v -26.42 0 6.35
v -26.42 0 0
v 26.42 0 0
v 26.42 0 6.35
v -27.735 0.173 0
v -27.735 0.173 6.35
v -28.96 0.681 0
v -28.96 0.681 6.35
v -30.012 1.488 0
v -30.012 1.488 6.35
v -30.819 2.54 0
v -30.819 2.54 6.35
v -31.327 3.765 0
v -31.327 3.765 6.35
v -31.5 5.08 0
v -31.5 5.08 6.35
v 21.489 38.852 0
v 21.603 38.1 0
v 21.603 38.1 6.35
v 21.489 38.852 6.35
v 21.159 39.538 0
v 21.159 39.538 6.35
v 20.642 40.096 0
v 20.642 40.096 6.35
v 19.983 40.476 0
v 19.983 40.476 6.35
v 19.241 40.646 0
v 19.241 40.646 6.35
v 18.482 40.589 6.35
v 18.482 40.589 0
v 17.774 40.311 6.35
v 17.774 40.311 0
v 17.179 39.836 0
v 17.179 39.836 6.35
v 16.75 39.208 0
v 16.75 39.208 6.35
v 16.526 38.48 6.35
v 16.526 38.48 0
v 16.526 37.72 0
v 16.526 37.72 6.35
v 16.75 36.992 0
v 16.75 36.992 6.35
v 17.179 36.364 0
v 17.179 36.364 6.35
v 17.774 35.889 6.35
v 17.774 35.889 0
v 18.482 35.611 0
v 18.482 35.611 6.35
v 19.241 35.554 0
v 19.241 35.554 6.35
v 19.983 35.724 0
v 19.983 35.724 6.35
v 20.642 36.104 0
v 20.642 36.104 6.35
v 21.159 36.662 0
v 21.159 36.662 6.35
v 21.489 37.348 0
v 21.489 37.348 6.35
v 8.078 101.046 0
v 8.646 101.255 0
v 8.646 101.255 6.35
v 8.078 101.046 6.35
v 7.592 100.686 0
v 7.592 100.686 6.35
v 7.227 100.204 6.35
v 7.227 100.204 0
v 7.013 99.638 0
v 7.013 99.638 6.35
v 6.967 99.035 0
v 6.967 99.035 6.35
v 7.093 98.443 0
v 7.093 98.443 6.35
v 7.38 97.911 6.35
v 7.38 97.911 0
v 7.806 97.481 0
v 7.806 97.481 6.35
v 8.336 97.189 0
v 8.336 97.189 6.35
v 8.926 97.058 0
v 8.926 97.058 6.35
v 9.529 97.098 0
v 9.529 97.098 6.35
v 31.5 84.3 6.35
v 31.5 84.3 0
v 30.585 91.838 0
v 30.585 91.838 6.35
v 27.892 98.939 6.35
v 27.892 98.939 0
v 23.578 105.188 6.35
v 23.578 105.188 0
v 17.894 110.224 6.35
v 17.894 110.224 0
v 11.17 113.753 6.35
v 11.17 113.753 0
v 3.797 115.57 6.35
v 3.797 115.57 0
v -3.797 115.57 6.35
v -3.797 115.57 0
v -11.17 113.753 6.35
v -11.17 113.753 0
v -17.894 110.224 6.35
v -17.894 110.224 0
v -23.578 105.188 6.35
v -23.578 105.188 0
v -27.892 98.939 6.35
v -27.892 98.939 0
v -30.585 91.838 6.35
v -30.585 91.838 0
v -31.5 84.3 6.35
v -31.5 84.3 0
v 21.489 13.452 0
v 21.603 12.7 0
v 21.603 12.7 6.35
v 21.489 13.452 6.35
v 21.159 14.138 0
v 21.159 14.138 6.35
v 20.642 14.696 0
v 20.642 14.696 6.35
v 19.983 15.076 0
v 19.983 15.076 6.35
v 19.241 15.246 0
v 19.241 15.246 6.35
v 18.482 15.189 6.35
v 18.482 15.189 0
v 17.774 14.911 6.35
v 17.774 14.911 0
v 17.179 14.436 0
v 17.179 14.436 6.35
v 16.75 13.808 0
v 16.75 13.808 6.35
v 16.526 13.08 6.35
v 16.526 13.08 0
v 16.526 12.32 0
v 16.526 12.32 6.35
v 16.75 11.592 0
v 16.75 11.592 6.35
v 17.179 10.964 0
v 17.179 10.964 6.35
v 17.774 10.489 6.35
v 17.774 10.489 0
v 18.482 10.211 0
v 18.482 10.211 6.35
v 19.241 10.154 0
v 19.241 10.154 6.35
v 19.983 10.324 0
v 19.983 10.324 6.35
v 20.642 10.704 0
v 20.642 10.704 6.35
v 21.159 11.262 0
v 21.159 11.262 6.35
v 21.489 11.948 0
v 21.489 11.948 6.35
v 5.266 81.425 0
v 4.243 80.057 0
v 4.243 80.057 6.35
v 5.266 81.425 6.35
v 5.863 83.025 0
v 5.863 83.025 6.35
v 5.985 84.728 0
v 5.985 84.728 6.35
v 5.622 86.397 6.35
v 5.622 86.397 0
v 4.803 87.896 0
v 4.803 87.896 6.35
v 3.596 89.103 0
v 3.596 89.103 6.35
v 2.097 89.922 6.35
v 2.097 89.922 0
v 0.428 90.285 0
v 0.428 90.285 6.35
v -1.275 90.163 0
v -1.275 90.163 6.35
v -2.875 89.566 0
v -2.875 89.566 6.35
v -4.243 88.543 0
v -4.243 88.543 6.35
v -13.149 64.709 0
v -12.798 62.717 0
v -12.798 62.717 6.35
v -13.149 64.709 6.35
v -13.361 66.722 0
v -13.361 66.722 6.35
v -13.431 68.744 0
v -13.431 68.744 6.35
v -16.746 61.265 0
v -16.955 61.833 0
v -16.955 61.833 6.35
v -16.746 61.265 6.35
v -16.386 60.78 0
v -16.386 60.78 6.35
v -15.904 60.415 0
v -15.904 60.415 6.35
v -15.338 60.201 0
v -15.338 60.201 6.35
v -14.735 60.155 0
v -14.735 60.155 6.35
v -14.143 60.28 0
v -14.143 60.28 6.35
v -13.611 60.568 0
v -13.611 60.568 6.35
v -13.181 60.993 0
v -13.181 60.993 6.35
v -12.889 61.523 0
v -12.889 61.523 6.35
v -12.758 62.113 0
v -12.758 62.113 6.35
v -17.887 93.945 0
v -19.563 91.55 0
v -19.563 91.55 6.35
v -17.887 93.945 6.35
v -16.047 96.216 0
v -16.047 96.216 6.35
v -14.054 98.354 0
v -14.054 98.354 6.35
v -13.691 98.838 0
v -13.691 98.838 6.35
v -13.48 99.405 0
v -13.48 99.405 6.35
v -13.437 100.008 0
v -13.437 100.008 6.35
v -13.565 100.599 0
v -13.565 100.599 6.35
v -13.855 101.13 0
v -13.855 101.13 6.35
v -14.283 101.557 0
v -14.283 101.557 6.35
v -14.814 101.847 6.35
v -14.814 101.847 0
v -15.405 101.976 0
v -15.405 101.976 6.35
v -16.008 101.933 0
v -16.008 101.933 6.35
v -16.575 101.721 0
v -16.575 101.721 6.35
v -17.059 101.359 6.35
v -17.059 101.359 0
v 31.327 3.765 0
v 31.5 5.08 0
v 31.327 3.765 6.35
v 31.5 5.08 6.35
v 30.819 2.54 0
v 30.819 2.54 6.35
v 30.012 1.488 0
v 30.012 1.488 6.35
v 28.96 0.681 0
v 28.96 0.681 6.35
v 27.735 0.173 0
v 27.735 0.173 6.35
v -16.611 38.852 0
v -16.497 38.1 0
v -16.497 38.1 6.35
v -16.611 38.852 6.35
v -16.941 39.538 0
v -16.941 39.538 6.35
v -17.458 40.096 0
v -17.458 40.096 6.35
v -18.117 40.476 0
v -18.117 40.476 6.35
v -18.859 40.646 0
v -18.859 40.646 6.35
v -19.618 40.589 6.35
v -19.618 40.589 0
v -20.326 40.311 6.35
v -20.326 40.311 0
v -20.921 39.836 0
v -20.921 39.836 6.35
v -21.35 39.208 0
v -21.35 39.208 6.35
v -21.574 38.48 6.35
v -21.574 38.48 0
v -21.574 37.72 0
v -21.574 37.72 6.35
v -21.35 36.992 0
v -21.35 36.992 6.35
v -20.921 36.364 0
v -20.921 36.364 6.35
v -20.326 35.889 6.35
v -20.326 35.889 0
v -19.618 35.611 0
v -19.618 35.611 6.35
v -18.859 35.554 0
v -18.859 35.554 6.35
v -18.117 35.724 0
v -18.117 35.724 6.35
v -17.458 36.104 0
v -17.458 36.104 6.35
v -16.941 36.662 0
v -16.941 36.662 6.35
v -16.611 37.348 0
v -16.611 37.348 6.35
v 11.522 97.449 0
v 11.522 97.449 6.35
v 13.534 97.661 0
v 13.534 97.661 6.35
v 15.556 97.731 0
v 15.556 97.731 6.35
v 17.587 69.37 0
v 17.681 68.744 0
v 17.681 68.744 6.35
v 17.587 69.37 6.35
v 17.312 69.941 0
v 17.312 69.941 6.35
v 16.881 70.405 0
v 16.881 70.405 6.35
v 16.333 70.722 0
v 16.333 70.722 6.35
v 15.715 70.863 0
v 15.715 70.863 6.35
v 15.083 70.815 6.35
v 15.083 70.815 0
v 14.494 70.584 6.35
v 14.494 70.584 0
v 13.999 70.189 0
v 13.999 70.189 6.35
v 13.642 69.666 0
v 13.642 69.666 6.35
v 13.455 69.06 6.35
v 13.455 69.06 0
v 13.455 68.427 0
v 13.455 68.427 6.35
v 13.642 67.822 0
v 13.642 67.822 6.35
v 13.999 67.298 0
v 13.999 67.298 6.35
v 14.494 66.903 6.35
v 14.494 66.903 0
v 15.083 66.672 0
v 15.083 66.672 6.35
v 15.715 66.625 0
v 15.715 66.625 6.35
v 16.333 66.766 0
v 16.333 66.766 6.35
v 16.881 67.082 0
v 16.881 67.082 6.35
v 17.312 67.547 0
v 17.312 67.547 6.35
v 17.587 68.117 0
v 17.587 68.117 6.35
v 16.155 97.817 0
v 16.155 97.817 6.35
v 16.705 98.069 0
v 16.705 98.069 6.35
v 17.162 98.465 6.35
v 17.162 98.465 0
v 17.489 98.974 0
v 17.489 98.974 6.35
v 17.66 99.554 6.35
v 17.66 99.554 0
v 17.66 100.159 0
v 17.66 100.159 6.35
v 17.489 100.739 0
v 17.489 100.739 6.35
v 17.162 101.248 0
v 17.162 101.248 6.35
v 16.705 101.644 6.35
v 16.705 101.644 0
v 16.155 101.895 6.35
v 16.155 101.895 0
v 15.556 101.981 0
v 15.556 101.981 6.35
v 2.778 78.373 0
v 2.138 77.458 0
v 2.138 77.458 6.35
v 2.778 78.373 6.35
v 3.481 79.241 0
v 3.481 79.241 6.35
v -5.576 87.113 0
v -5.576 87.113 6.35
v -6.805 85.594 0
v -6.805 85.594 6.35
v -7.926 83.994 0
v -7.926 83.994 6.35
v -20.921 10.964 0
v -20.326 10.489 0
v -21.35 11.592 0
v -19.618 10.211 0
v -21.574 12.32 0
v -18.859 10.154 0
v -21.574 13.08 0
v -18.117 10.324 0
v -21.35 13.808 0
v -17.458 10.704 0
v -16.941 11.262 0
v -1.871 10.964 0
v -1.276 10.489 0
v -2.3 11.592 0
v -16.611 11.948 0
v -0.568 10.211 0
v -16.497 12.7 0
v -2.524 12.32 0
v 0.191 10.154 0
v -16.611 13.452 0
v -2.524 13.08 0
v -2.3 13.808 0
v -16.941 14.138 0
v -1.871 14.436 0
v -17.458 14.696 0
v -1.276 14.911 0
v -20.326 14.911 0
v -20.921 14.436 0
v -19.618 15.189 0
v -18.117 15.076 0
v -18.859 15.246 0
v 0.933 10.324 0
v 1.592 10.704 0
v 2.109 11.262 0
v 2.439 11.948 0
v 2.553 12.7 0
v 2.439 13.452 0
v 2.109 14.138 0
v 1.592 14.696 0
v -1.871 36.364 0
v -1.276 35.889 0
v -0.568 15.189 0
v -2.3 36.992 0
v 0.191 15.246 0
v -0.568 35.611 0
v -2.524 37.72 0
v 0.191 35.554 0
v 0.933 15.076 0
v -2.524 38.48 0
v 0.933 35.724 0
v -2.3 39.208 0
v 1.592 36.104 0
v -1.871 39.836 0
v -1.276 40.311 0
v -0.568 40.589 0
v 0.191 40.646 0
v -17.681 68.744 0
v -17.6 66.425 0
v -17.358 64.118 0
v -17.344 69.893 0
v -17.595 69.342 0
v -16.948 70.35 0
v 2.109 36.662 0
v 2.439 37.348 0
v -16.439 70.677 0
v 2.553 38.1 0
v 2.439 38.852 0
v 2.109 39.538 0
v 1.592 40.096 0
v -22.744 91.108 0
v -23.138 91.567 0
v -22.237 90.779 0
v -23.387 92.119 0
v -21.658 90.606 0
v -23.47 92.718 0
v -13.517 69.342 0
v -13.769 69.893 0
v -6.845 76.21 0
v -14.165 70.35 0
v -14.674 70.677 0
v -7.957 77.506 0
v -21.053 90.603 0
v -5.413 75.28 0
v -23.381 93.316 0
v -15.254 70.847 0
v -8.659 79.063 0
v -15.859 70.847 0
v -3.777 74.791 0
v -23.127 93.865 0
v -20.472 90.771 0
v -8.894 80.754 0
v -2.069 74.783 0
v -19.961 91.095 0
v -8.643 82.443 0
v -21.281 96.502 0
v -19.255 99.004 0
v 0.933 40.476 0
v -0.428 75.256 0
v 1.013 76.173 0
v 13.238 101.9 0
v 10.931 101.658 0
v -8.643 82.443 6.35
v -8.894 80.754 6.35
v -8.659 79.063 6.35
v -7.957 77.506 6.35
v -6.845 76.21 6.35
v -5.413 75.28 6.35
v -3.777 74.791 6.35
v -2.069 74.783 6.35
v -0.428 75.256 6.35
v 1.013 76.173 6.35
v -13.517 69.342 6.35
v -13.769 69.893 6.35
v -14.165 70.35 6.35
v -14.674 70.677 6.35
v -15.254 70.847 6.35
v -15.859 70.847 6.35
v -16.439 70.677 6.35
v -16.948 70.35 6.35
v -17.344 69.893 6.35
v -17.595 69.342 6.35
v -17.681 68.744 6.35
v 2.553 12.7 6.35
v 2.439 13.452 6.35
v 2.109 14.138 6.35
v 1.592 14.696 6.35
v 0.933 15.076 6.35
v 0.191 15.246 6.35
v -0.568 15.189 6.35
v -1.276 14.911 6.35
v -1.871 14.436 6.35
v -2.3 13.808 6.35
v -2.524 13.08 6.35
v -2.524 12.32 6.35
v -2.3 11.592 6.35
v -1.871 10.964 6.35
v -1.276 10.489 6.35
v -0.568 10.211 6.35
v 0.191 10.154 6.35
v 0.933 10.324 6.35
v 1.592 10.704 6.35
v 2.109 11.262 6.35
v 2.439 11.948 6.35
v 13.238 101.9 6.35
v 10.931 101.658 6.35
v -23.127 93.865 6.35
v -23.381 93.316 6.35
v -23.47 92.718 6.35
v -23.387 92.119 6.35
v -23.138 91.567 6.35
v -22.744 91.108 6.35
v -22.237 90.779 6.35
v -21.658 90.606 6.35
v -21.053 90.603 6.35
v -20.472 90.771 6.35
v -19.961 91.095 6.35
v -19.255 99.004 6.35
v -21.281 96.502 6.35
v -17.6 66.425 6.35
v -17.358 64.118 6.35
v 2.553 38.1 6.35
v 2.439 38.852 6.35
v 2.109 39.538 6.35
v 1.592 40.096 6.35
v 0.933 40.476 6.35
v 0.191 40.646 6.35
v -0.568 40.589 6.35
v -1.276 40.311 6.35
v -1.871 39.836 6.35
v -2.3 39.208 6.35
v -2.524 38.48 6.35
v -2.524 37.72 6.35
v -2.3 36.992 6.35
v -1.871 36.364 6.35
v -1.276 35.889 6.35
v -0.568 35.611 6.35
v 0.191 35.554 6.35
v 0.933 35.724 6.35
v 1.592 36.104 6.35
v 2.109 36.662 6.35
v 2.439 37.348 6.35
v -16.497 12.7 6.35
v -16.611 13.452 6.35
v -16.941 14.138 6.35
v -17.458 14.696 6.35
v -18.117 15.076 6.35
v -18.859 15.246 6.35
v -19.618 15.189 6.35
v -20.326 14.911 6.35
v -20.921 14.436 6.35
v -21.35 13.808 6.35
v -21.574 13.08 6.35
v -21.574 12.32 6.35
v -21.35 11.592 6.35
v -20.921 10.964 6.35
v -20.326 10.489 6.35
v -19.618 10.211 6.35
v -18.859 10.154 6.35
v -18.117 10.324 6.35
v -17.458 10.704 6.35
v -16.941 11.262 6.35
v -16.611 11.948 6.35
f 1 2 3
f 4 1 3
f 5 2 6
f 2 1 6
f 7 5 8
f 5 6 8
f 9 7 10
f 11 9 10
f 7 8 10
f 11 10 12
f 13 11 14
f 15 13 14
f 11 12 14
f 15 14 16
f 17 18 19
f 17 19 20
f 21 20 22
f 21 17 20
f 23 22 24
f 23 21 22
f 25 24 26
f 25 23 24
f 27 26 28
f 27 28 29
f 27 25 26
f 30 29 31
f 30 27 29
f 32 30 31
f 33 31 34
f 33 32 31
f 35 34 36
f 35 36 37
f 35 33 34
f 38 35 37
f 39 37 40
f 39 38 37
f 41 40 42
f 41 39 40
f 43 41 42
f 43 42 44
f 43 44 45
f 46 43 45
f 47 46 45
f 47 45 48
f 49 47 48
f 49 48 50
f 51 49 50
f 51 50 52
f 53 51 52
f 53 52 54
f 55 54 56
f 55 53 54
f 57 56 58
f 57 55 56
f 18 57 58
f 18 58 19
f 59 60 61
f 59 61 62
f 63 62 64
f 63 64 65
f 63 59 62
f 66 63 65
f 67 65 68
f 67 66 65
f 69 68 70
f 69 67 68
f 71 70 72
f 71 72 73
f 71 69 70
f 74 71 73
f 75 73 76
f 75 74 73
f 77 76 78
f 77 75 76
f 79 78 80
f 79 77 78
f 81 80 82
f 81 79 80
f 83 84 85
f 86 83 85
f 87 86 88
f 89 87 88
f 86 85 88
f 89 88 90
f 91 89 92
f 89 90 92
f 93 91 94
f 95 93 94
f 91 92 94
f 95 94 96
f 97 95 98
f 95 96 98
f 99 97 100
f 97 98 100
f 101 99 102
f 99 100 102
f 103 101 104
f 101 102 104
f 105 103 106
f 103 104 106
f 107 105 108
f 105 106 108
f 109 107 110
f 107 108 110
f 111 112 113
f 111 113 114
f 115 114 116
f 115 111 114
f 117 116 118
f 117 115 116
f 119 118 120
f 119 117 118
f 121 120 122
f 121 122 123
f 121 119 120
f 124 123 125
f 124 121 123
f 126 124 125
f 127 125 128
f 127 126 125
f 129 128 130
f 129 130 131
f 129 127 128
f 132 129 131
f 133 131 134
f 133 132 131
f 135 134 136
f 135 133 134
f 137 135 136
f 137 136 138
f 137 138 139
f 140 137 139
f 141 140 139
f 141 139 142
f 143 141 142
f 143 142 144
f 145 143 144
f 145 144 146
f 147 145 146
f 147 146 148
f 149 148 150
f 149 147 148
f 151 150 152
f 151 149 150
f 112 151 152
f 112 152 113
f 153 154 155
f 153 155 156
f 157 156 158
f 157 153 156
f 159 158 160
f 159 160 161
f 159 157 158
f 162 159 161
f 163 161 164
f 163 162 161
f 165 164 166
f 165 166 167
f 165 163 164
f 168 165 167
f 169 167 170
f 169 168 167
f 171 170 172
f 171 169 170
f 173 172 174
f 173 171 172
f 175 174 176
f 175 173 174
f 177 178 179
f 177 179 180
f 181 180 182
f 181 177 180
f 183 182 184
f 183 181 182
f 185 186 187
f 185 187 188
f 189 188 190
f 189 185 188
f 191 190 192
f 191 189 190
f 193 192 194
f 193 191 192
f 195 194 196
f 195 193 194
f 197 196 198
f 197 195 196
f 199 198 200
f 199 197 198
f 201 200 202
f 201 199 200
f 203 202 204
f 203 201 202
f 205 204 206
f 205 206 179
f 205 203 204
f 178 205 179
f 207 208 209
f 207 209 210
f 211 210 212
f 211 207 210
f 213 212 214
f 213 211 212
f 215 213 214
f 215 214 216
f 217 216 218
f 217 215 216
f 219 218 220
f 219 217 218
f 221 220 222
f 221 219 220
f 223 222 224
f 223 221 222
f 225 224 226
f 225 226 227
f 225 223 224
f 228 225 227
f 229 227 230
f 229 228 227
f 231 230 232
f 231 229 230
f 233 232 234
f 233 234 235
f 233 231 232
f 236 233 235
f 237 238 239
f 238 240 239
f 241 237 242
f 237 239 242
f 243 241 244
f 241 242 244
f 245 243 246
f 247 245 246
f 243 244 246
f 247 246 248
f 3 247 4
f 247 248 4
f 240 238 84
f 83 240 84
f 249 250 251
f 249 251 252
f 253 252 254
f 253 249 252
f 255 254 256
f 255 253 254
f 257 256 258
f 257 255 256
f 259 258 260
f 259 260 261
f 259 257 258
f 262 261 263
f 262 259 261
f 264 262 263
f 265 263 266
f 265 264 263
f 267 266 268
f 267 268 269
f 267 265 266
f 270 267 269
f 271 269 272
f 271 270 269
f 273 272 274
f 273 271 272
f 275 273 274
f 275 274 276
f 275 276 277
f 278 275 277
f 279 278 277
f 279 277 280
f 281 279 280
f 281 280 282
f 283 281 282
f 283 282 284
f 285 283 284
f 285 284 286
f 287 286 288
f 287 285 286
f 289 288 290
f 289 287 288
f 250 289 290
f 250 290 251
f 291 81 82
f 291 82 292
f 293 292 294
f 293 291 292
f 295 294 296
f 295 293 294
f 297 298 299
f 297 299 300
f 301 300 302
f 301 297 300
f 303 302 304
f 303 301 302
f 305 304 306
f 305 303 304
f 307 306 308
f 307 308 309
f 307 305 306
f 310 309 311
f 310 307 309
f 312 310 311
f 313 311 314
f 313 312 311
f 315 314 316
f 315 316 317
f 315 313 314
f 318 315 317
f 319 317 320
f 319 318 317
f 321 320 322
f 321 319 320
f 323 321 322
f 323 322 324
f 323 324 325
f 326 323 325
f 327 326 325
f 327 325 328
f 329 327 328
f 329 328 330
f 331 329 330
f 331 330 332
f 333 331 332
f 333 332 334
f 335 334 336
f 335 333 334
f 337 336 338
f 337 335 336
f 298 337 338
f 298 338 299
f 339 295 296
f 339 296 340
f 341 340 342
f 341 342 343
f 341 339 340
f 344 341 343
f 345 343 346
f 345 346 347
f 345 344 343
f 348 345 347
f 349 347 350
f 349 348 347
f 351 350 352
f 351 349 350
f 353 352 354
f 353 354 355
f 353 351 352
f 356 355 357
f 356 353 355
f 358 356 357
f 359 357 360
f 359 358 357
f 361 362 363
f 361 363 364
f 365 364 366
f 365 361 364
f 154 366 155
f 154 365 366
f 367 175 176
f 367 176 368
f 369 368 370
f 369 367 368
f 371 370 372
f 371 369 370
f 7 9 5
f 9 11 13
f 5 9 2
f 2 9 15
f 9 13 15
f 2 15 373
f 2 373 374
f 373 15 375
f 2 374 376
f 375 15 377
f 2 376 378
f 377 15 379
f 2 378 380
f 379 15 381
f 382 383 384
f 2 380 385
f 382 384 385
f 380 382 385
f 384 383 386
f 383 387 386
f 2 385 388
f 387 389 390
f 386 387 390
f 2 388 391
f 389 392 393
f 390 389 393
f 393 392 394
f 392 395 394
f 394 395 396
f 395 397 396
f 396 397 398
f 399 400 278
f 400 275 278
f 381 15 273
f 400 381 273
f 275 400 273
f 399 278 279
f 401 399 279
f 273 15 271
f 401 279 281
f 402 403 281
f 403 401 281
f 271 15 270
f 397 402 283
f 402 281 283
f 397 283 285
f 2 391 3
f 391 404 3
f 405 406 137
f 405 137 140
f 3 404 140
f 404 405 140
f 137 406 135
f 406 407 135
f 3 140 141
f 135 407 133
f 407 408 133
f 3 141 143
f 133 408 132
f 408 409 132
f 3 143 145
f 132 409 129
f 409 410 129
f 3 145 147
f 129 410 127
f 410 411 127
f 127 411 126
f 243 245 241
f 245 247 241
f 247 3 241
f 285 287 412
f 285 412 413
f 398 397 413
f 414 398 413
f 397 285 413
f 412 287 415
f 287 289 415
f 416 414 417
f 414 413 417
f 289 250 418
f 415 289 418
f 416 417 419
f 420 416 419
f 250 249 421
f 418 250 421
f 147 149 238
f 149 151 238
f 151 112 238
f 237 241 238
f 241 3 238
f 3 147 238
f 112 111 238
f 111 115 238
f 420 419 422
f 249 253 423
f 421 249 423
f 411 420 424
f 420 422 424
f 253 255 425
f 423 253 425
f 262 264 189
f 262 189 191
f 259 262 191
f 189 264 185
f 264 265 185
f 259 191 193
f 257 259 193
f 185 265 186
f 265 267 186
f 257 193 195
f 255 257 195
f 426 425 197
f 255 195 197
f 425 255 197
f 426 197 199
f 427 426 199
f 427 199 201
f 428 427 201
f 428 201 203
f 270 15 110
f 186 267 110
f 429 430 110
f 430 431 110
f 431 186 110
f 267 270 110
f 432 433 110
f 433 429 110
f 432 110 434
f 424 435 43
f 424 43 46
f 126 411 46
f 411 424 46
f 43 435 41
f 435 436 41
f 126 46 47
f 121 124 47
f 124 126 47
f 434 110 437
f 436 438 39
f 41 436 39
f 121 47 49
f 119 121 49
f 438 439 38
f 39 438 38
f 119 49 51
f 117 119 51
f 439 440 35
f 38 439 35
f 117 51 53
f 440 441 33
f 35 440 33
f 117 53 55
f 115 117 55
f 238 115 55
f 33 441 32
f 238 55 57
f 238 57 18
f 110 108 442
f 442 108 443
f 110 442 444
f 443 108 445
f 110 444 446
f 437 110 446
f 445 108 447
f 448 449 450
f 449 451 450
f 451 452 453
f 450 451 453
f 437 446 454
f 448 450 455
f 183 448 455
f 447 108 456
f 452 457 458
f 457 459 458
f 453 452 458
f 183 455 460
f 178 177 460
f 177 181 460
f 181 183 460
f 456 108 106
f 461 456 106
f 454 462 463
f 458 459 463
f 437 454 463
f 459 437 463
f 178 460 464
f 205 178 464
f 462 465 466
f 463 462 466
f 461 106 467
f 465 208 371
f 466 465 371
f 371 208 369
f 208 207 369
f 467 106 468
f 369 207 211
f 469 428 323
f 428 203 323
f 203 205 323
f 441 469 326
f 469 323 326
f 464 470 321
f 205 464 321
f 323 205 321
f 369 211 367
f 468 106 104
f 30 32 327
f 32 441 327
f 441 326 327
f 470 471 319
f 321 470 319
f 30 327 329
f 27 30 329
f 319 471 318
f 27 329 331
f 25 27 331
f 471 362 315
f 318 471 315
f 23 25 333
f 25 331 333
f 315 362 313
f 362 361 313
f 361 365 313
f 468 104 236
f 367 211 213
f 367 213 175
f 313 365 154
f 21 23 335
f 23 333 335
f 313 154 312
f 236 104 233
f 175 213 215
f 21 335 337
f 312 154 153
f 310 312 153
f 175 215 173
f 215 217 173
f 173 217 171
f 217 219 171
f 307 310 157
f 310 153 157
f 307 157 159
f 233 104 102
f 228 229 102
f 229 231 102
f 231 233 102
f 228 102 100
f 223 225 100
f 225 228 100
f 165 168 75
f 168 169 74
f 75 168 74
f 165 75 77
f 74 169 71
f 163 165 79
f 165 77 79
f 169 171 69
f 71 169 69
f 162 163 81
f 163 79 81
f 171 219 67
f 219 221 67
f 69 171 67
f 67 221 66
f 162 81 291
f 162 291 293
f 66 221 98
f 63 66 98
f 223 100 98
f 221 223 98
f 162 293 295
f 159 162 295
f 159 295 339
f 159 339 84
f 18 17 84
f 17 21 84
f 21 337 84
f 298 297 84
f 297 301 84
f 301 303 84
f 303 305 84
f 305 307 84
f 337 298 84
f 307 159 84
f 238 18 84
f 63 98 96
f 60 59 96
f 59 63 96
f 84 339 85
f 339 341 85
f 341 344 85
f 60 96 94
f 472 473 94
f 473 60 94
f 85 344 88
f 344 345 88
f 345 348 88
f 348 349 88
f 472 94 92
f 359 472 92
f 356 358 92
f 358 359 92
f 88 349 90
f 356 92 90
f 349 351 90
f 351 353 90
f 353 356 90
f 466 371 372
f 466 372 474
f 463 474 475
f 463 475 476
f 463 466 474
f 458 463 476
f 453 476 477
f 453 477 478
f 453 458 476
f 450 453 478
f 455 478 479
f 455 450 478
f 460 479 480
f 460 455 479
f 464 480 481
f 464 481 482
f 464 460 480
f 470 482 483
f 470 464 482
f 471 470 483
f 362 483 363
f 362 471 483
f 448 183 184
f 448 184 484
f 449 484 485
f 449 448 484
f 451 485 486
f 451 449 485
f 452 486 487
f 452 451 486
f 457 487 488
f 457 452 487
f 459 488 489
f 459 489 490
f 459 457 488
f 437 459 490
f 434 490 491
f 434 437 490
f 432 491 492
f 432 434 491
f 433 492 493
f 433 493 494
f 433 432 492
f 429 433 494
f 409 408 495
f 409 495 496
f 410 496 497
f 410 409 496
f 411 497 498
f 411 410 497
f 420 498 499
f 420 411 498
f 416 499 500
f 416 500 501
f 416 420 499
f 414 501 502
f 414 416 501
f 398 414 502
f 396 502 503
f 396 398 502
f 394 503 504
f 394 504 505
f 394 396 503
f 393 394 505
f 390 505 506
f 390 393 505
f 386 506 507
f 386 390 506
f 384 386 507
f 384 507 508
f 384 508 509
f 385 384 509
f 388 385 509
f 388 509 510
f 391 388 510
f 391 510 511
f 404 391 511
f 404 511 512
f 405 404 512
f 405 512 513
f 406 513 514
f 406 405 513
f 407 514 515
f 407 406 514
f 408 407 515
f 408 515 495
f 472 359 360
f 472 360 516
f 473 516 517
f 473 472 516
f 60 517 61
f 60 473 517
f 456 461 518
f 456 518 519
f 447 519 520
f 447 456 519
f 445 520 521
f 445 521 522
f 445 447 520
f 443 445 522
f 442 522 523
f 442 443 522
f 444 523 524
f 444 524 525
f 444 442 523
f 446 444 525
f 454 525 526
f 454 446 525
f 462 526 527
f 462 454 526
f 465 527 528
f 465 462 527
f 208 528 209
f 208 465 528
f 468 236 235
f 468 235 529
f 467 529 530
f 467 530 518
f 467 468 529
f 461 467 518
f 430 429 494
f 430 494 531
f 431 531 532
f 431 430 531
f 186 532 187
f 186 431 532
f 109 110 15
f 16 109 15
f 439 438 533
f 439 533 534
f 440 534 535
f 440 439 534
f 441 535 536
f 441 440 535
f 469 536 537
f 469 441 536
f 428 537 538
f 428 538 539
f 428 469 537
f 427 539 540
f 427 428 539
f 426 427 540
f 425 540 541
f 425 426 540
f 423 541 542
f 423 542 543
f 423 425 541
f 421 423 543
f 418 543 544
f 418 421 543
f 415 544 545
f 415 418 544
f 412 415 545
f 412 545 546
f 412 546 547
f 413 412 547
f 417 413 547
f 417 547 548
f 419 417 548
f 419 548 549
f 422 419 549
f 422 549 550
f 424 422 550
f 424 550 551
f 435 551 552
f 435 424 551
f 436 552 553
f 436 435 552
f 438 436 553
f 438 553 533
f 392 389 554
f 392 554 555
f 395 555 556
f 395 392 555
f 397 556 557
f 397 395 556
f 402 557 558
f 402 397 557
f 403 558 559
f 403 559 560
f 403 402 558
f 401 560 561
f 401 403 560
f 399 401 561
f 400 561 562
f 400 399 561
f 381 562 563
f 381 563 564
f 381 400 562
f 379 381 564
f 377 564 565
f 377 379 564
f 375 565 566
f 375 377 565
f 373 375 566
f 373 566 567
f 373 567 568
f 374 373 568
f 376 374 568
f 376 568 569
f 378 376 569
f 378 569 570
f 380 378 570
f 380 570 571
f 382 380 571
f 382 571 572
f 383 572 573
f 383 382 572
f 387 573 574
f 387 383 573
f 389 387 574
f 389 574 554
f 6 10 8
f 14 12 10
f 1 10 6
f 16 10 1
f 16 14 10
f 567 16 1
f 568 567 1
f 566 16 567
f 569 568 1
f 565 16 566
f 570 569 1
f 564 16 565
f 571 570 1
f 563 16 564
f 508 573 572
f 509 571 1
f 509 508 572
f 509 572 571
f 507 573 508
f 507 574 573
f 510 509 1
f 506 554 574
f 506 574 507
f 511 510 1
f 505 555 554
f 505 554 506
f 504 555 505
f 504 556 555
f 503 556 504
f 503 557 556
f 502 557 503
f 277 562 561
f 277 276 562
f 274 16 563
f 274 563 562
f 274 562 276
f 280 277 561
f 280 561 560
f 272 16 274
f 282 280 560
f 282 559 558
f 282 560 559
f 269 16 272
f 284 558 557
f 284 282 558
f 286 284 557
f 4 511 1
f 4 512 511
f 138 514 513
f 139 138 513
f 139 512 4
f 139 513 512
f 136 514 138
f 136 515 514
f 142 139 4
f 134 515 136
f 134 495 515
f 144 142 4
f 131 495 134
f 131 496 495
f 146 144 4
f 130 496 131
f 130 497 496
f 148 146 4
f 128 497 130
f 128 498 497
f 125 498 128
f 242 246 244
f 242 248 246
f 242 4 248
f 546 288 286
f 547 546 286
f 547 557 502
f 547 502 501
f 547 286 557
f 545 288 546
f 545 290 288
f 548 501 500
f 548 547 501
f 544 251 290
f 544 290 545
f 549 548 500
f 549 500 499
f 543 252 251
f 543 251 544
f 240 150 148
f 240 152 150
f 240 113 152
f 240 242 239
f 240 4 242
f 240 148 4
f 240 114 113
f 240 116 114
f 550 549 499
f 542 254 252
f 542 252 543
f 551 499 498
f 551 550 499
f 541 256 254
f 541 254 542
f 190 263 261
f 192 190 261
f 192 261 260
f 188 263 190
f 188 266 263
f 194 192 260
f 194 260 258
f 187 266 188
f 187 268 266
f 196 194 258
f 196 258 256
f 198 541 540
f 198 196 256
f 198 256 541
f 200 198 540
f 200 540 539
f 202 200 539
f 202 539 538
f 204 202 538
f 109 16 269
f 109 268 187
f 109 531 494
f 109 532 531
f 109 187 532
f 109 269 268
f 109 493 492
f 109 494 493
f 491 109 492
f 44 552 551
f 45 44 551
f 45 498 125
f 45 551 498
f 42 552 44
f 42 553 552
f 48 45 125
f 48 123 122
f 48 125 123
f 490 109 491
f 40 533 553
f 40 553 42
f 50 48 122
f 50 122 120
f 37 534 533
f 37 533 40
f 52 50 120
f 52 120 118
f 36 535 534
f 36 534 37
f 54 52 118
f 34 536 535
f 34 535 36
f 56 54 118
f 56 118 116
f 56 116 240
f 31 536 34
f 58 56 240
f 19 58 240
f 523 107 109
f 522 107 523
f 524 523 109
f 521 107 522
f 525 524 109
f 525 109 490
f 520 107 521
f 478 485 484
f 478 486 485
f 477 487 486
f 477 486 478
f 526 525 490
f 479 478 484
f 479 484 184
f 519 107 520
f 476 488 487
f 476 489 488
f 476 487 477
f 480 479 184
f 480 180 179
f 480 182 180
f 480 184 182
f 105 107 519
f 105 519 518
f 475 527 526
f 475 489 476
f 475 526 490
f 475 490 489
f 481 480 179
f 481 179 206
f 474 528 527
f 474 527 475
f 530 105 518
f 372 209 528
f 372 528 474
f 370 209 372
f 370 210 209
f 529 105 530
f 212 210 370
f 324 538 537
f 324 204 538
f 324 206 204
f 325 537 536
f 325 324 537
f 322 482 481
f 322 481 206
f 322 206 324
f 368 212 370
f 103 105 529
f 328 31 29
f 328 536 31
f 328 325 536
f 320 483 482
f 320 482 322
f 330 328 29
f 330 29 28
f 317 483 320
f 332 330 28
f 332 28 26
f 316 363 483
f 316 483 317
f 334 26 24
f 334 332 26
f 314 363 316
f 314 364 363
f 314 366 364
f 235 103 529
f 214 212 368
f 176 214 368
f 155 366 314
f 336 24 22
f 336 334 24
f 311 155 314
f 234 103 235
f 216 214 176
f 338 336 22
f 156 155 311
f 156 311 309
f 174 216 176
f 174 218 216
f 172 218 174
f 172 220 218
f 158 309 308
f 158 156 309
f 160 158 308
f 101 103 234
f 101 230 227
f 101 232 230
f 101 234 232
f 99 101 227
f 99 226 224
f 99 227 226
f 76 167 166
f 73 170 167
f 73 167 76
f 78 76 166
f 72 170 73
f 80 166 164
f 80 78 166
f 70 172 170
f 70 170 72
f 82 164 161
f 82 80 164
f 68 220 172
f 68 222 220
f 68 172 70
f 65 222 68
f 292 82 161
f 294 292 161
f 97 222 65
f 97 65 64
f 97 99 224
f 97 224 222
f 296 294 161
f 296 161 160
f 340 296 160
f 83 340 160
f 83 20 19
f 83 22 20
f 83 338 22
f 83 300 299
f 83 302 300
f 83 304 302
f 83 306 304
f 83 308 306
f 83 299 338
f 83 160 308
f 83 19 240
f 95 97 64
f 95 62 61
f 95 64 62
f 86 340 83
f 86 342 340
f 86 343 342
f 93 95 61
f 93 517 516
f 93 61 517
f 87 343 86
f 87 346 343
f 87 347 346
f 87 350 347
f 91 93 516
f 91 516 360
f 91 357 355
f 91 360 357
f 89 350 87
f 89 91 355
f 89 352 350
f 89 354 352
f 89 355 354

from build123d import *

# Parameters (mm, degrees)
SKETCH1_R           = 2.125
SKETCH1_R_2         = 2.5527
BOSS_EXTRUDE1_DEPTH = 6.35
FILLET1_R           = 5.08


with BuildPart() as part:
    # Sketch1 → Boss-Extrude1 (new body)
    with BuildSketch(Plane.XY):
        with BuildLine():
            Line((31.499999992, 0), (31.499999992, 84.3))
            ThreePointArc((31.499999992, 84.3), (0, 115.799999992), (-31.499999992, 84.3))
            Line((-31.499999992, 84.3), (-31.499999992, 0))
            Line((-31.499999992, 0), (31.499999992, 0))
        make_face()
        with Locations((15.556349186, 68.743650814)):
            Circle(SKETCH1_R, mode=Mode.SUBTRACT)
        with Locations((19.05, 12.7)):
            Circle(SKETCH1_R_2, mode=Mode.SUBTRACT)
        with Locations((0, 12.7)):
            Circle(SKETCH1_R_2, mode=Mode.SUBTRACT)
        with Locations((0, 38.1)):
            Circle(SKETCH1_R_2, mode=Mode.SUBTRACT)
        with Locations((19.05, 38.1)):
            Circle(SKETCH1_R_2, mode=Mode.SUBTRACT)
        with Locations((-19.05, 12.7)):
            Circle(SKETCH1_R_2, mode=Mode.SUBTRACT)
        with Locations((-19.05, 38.1)):
            Circle(SKETCH1_R_2, mode=Mode.SUBTRACT)
        with BuildLine():
            ThreePointArc((15.556349186, 101.981349186), (12.082063653, 101.799269597), (8.645843119, 101.255025731))
            ThreePointArc((8.645843119, 101.255025731), (7.00909181, 98.734649736), (9.529467805, 97.097898427))
            ThreePointArc((9.529467805, 97.097898427), (12.526309622, 97.572551541), (15.556349186, 97.731349186))
            ThreePointArc((15.556349186, 97.731349186), (17.681349186, 99.856349186), (15.556349186, 101.981349186))
        make_face(mode=Mode.SUBTRACT)
        with BuildLine():
            ThreePointArc((-17.681349186, 68.743650814), (-17.499269597, 65.26936528), (-16.955025731, 61.833144746))
            ThreePointArc((-16.955025731, 61.833144746), (-14.434649736, 60.196393438), (-12.797898427, 62.716769432))
            ThreePointArc((-12.797898427, 62.716769432), (-13.272551541, 65.713611249), (-13.431349186, 68.743650814))
            ThreePointArc((-13.431349186, 68.743650814), (-15.556349186, 70.868650814), (-17.681349186, 68.743650814))
        make_face(mode=Mode.SUBTRACT)
        with BuildLine():
            ThreePointArc((-17.058951096, 101.358951096), (-20.289508286, 97.771053851), (-23.12733076, 93.865126304))
            ThreePointArc((-23.12733076, 93.865126304), (-22.502513753, 90.925593398), (-19.562980847, 91.550410405))
            ThreePointArc((-19.562980847, 91.550410405), (-16.98663795, 95.096442189), (-14.053747276, 98.353747276))
            ThreePointArc((-14.053747276, 98.353747276), (-14.053747276, 101.358951096), (-17.058951096, 101.358951096))
        make_face(mode=Mode.SUBTRACT)
        with BuildLine():
            ThreePointArc((-4.242640687, 88.542640687), (-6.203737735, 86.364621763), (-7.926426716, 83.993543794))
            ThreePointArc((-7.926426716, 83.993543794), (-6.162237519, 75.693686177), (2.137620099, 77.457875374))
            ThreePointArc((2.137620099, 77.457875374), (3.122013803, 78.812777071), (4.242640687, 80.057359313))
            ThreePointArc((4.242640687, 80.057359313), (4.242640687, 88.542640687), (-4.242640687, 88.542640687))
        make_face(mode=Mode.SUBTRACT)
    extrude(amount=BOSS_EXTRUDE1_DEPTH)

    # Fillet1
    fillet1_edges = [part.edges().sort_by_distance(p)[0] for p in [
        (31.499999992, 0, 3.175),
        (-31.499999992, 0, 3.175),
    ]]
    fillet(fillet1_edges, radius=FILLET1_R)


solid = part.part
